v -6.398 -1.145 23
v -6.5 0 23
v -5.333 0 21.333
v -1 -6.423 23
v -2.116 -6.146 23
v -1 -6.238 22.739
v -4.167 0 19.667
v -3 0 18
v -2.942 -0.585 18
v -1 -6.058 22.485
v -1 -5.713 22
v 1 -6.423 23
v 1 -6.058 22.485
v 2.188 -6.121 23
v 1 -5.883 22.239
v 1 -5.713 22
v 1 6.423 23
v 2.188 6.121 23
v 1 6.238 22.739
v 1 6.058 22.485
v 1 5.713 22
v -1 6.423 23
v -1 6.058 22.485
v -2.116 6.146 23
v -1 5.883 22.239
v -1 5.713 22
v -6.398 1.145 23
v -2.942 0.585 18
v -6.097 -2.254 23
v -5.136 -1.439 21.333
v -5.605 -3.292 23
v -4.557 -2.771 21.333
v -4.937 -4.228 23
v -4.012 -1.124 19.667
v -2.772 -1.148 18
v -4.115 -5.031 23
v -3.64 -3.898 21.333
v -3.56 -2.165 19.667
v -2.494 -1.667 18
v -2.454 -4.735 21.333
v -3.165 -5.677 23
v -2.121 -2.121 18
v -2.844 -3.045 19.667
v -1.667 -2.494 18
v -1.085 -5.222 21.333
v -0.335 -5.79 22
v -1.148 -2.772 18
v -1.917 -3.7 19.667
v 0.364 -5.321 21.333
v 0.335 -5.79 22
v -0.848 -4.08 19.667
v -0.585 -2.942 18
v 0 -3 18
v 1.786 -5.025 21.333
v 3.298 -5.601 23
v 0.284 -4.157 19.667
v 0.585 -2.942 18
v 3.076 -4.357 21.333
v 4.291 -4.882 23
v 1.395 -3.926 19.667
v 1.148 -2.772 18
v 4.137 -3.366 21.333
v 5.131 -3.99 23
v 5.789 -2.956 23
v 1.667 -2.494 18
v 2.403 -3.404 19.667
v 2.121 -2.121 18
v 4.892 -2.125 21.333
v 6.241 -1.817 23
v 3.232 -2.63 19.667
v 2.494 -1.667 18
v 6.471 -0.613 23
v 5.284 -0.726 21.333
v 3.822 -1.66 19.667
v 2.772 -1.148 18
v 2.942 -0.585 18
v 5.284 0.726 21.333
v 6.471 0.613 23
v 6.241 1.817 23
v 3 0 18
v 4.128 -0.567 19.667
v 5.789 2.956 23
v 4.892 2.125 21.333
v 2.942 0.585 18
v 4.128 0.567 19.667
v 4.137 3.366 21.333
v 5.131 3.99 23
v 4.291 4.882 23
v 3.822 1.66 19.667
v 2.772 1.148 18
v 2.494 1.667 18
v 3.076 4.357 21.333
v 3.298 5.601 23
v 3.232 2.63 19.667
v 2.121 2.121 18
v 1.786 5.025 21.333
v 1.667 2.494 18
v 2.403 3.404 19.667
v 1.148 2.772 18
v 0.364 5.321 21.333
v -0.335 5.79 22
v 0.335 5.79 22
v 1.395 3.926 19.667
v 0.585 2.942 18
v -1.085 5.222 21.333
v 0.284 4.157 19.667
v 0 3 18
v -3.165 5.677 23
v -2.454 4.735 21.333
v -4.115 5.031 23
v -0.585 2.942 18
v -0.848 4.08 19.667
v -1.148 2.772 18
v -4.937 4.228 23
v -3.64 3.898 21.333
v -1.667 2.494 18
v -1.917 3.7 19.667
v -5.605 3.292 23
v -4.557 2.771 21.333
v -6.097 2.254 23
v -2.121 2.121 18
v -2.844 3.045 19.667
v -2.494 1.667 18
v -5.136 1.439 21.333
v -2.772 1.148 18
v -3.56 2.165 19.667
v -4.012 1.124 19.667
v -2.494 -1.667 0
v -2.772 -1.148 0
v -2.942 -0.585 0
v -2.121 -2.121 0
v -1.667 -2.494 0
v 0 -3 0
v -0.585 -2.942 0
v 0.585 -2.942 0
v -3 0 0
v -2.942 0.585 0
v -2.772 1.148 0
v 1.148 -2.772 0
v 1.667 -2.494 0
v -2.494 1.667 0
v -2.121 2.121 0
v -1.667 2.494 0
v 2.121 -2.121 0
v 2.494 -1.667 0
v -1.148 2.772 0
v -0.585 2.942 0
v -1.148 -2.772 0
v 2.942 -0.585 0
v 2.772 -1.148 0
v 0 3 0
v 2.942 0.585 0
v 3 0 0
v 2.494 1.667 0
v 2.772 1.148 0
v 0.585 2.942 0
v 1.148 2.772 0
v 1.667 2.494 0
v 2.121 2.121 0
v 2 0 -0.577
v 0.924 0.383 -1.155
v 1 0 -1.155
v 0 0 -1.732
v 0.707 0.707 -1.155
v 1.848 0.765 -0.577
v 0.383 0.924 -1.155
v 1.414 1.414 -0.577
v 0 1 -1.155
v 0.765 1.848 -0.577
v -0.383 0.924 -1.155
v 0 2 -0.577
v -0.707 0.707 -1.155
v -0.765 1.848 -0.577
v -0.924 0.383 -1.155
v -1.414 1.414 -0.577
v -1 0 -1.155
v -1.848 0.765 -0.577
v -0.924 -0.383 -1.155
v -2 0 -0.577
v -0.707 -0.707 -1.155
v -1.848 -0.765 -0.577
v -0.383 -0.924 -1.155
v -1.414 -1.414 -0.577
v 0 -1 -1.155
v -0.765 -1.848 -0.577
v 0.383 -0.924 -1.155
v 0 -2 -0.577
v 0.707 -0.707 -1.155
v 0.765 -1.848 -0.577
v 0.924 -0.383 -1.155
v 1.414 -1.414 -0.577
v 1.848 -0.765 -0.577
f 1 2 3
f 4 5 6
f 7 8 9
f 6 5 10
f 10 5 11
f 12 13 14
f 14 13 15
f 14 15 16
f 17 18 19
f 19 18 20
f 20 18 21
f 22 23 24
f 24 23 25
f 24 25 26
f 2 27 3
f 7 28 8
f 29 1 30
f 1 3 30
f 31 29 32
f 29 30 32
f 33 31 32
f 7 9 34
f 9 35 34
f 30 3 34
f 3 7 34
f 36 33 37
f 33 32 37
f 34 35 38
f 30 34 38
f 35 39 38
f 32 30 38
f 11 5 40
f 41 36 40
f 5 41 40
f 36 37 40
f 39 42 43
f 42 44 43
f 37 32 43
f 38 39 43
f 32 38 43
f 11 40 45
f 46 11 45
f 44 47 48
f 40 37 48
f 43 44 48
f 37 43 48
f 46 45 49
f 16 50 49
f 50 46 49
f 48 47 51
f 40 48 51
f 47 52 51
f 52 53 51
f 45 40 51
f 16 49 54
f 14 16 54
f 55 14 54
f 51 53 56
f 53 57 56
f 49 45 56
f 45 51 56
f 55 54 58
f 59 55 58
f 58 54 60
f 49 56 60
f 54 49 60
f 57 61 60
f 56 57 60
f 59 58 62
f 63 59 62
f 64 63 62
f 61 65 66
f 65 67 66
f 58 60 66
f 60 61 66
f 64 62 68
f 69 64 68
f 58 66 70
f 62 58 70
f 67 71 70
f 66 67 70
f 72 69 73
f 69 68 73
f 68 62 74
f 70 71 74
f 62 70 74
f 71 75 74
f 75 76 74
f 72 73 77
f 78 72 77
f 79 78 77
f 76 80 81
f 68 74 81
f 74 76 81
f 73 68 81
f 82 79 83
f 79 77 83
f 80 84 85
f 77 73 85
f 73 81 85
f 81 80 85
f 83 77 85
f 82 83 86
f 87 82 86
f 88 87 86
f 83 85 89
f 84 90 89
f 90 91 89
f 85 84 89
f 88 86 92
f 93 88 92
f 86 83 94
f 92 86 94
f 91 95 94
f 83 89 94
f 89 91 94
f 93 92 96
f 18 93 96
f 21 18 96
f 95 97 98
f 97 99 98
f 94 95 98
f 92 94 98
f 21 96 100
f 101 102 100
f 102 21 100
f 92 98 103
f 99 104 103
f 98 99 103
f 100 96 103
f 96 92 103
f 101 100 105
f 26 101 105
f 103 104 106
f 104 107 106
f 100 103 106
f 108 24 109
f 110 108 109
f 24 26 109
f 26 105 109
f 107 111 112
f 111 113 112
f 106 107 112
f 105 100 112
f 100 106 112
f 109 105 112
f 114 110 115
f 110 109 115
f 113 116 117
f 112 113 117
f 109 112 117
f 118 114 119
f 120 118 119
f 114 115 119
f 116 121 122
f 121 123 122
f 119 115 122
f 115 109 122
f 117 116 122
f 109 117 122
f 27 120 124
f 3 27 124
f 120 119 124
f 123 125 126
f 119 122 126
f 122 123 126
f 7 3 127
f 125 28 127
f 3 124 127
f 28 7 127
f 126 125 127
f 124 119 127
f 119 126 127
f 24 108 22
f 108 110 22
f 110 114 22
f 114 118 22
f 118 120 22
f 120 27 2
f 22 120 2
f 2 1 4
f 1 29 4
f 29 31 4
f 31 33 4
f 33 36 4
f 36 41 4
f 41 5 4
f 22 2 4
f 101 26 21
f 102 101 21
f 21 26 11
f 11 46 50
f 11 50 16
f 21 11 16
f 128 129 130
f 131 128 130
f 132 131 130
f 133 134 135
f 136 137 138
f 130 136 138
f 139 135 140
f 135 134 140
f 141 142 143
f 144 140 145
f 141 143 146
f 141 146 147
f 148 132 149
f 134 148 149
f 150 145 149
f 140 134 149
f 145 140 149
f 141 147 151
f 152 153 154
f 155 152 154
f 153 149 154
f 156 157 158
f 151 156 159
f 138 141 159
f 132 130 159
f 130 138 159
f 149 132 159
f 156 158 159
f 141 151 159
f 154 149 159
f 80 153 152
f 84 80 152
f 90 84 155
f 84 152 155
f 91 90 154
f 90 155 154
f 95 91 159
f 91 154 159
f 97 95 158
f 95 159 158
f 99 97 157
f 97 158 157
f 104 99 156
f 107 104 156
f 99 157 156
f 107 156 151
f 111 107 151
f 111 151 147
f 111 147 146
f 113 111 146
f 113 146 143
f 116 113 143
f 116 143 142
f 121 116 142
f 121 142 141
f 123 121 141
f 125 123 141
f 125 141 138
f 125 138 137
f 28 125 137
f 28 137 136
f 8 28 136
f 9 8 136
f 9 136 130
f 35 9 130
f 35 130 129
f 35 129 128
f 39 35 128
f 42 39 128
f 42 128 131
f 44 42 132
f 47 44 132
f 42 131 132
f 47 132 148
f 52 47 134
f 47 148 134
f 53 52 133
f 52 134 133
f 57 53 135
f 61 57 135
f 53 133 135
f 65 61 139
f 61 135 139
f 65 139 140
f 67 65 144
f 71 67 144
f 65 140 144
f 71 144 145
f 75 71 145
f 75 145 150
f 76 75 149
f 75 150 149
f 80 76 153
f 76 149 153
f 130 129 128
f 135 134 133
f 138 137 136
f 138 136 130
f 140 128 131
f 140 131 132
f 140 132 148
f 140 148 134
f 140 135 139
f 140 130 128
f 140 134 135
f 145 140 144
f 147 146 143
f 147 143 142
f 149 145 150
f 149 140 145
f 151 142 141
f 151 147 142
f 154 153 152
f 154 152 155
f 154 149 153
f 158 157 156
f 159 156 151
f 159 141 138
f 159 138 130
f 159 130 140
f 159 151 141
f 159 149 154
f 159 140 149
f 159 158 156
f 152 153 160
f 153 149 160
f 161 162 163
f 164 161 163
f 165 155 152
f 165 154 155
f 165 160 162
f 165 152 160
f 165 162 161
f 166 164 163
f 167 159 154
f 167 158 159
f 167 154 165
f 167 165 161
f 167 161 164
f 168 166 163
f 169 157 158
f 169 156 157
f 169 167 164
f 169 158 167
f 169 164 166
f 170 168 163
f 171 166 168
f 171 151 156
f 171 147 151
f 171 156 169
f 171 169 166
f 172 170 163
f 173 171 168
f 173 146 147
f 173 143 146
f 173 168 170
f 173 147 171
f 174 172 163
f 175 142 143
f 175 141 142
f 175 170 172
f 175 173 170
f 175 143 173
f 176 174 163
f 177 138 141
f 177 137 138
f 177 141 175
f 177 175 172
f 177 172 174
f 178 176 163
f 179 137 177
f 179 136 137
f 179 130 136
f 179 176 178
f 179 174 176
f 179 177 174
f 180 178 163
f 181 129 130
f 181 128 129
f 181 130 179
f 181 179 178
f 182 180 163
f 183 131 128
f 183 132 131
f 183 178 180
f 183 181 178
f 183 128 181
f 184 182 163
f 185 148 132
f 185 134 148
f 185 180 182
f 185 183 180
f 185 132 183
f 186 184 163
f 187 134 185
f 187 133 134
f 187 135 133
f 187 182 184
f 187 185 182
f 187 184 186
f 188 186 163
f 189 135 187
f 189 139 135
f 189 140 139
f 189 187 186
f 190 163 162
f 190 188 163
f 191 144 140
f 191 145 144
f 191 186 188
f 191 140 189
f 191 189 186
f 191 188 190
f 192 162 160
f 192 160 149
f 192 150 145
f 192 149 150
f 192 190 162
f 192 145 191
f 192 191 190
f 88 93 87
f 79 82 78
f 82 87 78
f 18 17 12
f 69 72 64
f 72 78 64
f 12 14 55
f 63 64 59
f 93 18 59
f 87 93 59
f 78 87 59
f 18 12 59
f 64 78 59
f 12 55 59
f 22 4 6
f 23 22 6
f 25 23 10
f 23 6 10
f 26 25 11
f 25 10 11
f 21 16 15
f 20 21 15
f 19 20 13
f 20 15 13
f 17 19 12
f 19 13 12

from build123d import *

# Parameters (mm, degrees)
F0_R     = 3
F1_DEPTH = 18
F7_DEPTH = 12.5


with BuildPart() as f1:
    # F0 (on Top) → F1 (new body)
    with BuildSketch(Plane.XY):
        Circle(F0_R)
    extrude(amount=F1_DEPTH)

    # F4 (on Front) → F5 (revolve)
    with BuildSketch(Plane.XZ):
        Polygon((-3, 18), (0, 18), (0, 23), (-6.5, 23), align=None)
    revolve(axis=Axis((0, 0, 20.5), (0, 0, 1)))

    # F6 (on Front) → F7 (cut, symmetric)
    with BuildSketch(Plane.XZ):
        Polygon((-1, 22), (0, 22), (1, 22), (1, 23), (-1, 23), align=None)
    extrude(amount=F7_DEPTH, both=True, mode=Mode.SUBTRACT)


with BuildPart() as f3:
    # F2 (on Front) → F3 (revolve)
    with BuildSketch(Plane.XZ):
        Polygon((3, 0), (0, 0), (0, -1.732051), align=None)
    revolve(axis=Axis((0, 0, -0.866025), (0, 0, 1)))


solid = Compound([f1.part, f3.part])
